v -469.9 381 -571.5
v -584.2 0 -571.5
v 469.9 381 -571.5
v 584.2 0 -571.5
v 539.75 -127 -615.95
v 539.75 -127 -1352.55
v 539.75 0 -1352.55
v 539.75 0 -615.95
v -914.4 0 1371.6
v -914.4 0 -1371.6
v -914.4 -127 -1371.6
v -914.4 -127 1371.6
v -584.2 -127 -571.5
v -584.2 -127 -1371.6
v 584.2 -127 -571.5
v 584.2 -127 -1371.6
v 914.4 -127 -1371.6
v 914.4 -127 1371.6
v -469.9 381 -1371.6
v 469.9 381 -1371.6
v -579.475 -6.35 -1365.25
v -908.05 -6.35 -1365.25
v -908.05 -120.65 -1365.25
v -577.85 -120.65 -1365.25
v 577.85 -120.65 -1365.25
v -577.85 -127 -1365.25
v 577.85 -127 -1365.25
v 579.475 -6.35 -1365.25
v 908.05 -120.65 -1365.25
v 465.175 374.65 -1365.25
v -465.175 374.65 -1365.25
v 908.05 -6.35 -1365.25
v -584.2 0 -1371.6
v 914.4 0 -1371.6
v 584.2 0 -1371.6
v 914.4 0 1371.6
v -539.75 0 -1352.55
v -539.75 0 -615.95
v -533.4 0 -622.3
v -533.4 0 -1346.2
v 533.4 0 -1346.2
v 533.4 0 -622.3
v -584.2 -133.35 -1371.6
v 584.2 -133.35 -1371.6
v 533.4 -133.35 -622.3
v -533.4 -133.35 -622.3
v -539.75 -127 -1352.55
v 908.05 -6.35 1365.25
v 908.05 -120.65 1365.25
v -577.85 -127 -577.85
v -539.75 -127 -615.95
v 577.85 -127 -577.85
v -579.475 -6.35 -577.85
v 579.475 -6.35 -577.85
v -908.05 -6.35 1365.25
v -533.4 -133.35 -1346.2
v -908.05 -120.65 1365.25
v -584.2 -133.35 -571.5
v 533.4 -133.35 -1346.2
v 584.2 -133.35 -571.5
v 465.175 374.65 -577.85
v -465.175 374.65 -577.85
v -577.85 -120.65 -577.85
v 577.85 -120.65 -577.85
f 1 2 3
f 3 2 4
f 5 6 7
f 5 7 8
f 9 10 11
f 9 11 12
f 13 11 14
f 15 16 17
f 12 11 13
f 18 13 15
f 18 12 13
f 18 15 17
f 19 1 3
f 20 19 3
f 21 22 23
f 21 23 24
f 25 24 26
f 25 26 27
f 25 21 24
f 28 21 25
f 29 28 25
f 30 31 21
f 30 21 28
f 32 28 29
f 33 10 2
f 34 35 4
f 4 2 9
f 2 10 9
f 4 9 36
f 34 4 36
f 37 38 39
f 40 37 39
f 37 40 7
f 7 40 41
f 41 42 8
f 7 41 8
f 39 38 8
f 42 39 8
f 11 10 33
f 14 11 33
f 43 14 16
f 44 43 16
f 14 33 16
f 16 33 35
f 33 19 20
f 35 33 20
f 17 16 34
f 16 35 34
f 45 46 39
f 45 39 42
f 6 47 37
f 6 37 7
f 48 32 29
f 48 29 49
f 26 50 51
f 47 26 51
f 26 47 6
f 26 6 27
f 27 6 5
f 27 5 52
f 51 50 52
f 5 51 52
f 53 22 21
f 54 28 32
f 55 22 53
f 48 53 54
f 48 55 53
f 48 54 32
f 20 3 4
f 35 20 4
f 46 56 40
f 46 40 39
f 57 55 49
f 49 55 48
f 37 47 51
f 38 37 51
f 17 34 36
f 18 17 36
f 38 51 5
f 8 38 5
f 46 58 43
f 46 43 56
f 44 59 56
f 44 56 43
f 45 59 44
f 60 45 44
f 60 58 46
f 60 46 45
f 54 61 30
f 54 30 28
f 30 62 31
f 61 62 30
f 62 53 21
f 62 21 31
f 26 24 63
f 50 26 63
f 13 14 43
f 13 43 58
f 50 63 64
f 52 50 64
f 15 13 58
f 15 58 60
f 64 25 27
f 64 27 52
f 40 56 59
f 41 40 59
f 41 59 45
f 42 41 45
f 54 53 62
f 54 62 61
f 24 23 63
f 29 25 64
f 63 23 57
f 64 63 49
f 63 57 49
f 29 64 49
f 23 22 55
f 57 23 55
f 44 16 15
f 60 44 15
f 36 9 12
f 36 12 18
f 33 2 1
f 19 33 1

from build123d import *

# Parameters (mm, degrees)
F0_W          = 1828.8
F0_H          = 2743.2
F1_DEPTH      = 127
F2_W          = 1168.4
F2_H          = 800.1
F2_W_2        = 1066.8
F2_H_2        = 723.9
F3_DEPTH      = 508
F3_DEPTH_BACK = 6.35
F5_DEPTH      = 800.101
F6_W          = 1066.8
F6_H          = 723.9
F7_DEPTH      = 133.35
F8_T          = -6.35


# Not quite as in the source:
# - a shell that OpenCascade refuses in one call is made with other operations: the cavity is built on its own and cut out


with BuildPart() as f1:
    # F0 (on Front) → F1 (new body)
    with BuildSketch(Plane.XZ):
        Rectangle(F0_W, F0_H)
    extrude(amount=F1_DEPTH)

    # F2 (on face) → F3 (join, two sides)
    with BuildSketch(Plane.XZ.offset(127)) as f3_sk:
        with Locations((0, -971.55)):
            Rectangle(F2_W, F2_H)
        with Locations((0, -984.25)):
            Rectangle(F2_W_2, F2_H_2, mode=Mode.SUBTRACT)
        with Locations((0, -984.25)):
            Rectangle(F2_W_2, F2_H_2)
    extrude(amount=-F3_DEPTH)
    extrude(f3_sk.sketch, amount=F3_DEPTH_BACK)

    # F4 (on face) → F5 (cut, through all)
    with BuildSketch(Plane.XY.offset(-571.5)):
        Polygon((-469.9, 381), (-584.2, 381), (-584.2, 0), align=None)
        Polygon((584.2, 381), (469.9, 381), (584.2, 0), align=None)
    extrude(amount=-F5_DEPTH, mode=Mode.SUBTRACT)

    # F6 (on face) → F7 (cut)
    with BuildSketch(Plane.XZ.offset(133.35)):
        with Locations((0, -984.25)):
            Rectangle(F6_W, F6_H)
    extrude(amount=-F7_DEPTH, mode=Mode.SUBTRACT)

    # F8: a shell. OpenCascade refuses it in one call, so the cavity is built on its own and cut out:
    # the body offset inwards by the wall thickness, plus a prism from it out through each open face.
    f8_core = offset(f1.part, amount=F8_T, kind=Kind.INTERSECTION, mode=Mode.PRIVATE)
    f8_exits = [f8_core.faces().sort_by_distance(p)[0] for p in [
        (0, 6.35, -984.25),
    ]]
    add(f8_core, mode=Mode.SUBTRACT)
    extrude(f8_exits, amount=-F8_T, mode=Mode.SUBTRACT)


solid = f1.part
